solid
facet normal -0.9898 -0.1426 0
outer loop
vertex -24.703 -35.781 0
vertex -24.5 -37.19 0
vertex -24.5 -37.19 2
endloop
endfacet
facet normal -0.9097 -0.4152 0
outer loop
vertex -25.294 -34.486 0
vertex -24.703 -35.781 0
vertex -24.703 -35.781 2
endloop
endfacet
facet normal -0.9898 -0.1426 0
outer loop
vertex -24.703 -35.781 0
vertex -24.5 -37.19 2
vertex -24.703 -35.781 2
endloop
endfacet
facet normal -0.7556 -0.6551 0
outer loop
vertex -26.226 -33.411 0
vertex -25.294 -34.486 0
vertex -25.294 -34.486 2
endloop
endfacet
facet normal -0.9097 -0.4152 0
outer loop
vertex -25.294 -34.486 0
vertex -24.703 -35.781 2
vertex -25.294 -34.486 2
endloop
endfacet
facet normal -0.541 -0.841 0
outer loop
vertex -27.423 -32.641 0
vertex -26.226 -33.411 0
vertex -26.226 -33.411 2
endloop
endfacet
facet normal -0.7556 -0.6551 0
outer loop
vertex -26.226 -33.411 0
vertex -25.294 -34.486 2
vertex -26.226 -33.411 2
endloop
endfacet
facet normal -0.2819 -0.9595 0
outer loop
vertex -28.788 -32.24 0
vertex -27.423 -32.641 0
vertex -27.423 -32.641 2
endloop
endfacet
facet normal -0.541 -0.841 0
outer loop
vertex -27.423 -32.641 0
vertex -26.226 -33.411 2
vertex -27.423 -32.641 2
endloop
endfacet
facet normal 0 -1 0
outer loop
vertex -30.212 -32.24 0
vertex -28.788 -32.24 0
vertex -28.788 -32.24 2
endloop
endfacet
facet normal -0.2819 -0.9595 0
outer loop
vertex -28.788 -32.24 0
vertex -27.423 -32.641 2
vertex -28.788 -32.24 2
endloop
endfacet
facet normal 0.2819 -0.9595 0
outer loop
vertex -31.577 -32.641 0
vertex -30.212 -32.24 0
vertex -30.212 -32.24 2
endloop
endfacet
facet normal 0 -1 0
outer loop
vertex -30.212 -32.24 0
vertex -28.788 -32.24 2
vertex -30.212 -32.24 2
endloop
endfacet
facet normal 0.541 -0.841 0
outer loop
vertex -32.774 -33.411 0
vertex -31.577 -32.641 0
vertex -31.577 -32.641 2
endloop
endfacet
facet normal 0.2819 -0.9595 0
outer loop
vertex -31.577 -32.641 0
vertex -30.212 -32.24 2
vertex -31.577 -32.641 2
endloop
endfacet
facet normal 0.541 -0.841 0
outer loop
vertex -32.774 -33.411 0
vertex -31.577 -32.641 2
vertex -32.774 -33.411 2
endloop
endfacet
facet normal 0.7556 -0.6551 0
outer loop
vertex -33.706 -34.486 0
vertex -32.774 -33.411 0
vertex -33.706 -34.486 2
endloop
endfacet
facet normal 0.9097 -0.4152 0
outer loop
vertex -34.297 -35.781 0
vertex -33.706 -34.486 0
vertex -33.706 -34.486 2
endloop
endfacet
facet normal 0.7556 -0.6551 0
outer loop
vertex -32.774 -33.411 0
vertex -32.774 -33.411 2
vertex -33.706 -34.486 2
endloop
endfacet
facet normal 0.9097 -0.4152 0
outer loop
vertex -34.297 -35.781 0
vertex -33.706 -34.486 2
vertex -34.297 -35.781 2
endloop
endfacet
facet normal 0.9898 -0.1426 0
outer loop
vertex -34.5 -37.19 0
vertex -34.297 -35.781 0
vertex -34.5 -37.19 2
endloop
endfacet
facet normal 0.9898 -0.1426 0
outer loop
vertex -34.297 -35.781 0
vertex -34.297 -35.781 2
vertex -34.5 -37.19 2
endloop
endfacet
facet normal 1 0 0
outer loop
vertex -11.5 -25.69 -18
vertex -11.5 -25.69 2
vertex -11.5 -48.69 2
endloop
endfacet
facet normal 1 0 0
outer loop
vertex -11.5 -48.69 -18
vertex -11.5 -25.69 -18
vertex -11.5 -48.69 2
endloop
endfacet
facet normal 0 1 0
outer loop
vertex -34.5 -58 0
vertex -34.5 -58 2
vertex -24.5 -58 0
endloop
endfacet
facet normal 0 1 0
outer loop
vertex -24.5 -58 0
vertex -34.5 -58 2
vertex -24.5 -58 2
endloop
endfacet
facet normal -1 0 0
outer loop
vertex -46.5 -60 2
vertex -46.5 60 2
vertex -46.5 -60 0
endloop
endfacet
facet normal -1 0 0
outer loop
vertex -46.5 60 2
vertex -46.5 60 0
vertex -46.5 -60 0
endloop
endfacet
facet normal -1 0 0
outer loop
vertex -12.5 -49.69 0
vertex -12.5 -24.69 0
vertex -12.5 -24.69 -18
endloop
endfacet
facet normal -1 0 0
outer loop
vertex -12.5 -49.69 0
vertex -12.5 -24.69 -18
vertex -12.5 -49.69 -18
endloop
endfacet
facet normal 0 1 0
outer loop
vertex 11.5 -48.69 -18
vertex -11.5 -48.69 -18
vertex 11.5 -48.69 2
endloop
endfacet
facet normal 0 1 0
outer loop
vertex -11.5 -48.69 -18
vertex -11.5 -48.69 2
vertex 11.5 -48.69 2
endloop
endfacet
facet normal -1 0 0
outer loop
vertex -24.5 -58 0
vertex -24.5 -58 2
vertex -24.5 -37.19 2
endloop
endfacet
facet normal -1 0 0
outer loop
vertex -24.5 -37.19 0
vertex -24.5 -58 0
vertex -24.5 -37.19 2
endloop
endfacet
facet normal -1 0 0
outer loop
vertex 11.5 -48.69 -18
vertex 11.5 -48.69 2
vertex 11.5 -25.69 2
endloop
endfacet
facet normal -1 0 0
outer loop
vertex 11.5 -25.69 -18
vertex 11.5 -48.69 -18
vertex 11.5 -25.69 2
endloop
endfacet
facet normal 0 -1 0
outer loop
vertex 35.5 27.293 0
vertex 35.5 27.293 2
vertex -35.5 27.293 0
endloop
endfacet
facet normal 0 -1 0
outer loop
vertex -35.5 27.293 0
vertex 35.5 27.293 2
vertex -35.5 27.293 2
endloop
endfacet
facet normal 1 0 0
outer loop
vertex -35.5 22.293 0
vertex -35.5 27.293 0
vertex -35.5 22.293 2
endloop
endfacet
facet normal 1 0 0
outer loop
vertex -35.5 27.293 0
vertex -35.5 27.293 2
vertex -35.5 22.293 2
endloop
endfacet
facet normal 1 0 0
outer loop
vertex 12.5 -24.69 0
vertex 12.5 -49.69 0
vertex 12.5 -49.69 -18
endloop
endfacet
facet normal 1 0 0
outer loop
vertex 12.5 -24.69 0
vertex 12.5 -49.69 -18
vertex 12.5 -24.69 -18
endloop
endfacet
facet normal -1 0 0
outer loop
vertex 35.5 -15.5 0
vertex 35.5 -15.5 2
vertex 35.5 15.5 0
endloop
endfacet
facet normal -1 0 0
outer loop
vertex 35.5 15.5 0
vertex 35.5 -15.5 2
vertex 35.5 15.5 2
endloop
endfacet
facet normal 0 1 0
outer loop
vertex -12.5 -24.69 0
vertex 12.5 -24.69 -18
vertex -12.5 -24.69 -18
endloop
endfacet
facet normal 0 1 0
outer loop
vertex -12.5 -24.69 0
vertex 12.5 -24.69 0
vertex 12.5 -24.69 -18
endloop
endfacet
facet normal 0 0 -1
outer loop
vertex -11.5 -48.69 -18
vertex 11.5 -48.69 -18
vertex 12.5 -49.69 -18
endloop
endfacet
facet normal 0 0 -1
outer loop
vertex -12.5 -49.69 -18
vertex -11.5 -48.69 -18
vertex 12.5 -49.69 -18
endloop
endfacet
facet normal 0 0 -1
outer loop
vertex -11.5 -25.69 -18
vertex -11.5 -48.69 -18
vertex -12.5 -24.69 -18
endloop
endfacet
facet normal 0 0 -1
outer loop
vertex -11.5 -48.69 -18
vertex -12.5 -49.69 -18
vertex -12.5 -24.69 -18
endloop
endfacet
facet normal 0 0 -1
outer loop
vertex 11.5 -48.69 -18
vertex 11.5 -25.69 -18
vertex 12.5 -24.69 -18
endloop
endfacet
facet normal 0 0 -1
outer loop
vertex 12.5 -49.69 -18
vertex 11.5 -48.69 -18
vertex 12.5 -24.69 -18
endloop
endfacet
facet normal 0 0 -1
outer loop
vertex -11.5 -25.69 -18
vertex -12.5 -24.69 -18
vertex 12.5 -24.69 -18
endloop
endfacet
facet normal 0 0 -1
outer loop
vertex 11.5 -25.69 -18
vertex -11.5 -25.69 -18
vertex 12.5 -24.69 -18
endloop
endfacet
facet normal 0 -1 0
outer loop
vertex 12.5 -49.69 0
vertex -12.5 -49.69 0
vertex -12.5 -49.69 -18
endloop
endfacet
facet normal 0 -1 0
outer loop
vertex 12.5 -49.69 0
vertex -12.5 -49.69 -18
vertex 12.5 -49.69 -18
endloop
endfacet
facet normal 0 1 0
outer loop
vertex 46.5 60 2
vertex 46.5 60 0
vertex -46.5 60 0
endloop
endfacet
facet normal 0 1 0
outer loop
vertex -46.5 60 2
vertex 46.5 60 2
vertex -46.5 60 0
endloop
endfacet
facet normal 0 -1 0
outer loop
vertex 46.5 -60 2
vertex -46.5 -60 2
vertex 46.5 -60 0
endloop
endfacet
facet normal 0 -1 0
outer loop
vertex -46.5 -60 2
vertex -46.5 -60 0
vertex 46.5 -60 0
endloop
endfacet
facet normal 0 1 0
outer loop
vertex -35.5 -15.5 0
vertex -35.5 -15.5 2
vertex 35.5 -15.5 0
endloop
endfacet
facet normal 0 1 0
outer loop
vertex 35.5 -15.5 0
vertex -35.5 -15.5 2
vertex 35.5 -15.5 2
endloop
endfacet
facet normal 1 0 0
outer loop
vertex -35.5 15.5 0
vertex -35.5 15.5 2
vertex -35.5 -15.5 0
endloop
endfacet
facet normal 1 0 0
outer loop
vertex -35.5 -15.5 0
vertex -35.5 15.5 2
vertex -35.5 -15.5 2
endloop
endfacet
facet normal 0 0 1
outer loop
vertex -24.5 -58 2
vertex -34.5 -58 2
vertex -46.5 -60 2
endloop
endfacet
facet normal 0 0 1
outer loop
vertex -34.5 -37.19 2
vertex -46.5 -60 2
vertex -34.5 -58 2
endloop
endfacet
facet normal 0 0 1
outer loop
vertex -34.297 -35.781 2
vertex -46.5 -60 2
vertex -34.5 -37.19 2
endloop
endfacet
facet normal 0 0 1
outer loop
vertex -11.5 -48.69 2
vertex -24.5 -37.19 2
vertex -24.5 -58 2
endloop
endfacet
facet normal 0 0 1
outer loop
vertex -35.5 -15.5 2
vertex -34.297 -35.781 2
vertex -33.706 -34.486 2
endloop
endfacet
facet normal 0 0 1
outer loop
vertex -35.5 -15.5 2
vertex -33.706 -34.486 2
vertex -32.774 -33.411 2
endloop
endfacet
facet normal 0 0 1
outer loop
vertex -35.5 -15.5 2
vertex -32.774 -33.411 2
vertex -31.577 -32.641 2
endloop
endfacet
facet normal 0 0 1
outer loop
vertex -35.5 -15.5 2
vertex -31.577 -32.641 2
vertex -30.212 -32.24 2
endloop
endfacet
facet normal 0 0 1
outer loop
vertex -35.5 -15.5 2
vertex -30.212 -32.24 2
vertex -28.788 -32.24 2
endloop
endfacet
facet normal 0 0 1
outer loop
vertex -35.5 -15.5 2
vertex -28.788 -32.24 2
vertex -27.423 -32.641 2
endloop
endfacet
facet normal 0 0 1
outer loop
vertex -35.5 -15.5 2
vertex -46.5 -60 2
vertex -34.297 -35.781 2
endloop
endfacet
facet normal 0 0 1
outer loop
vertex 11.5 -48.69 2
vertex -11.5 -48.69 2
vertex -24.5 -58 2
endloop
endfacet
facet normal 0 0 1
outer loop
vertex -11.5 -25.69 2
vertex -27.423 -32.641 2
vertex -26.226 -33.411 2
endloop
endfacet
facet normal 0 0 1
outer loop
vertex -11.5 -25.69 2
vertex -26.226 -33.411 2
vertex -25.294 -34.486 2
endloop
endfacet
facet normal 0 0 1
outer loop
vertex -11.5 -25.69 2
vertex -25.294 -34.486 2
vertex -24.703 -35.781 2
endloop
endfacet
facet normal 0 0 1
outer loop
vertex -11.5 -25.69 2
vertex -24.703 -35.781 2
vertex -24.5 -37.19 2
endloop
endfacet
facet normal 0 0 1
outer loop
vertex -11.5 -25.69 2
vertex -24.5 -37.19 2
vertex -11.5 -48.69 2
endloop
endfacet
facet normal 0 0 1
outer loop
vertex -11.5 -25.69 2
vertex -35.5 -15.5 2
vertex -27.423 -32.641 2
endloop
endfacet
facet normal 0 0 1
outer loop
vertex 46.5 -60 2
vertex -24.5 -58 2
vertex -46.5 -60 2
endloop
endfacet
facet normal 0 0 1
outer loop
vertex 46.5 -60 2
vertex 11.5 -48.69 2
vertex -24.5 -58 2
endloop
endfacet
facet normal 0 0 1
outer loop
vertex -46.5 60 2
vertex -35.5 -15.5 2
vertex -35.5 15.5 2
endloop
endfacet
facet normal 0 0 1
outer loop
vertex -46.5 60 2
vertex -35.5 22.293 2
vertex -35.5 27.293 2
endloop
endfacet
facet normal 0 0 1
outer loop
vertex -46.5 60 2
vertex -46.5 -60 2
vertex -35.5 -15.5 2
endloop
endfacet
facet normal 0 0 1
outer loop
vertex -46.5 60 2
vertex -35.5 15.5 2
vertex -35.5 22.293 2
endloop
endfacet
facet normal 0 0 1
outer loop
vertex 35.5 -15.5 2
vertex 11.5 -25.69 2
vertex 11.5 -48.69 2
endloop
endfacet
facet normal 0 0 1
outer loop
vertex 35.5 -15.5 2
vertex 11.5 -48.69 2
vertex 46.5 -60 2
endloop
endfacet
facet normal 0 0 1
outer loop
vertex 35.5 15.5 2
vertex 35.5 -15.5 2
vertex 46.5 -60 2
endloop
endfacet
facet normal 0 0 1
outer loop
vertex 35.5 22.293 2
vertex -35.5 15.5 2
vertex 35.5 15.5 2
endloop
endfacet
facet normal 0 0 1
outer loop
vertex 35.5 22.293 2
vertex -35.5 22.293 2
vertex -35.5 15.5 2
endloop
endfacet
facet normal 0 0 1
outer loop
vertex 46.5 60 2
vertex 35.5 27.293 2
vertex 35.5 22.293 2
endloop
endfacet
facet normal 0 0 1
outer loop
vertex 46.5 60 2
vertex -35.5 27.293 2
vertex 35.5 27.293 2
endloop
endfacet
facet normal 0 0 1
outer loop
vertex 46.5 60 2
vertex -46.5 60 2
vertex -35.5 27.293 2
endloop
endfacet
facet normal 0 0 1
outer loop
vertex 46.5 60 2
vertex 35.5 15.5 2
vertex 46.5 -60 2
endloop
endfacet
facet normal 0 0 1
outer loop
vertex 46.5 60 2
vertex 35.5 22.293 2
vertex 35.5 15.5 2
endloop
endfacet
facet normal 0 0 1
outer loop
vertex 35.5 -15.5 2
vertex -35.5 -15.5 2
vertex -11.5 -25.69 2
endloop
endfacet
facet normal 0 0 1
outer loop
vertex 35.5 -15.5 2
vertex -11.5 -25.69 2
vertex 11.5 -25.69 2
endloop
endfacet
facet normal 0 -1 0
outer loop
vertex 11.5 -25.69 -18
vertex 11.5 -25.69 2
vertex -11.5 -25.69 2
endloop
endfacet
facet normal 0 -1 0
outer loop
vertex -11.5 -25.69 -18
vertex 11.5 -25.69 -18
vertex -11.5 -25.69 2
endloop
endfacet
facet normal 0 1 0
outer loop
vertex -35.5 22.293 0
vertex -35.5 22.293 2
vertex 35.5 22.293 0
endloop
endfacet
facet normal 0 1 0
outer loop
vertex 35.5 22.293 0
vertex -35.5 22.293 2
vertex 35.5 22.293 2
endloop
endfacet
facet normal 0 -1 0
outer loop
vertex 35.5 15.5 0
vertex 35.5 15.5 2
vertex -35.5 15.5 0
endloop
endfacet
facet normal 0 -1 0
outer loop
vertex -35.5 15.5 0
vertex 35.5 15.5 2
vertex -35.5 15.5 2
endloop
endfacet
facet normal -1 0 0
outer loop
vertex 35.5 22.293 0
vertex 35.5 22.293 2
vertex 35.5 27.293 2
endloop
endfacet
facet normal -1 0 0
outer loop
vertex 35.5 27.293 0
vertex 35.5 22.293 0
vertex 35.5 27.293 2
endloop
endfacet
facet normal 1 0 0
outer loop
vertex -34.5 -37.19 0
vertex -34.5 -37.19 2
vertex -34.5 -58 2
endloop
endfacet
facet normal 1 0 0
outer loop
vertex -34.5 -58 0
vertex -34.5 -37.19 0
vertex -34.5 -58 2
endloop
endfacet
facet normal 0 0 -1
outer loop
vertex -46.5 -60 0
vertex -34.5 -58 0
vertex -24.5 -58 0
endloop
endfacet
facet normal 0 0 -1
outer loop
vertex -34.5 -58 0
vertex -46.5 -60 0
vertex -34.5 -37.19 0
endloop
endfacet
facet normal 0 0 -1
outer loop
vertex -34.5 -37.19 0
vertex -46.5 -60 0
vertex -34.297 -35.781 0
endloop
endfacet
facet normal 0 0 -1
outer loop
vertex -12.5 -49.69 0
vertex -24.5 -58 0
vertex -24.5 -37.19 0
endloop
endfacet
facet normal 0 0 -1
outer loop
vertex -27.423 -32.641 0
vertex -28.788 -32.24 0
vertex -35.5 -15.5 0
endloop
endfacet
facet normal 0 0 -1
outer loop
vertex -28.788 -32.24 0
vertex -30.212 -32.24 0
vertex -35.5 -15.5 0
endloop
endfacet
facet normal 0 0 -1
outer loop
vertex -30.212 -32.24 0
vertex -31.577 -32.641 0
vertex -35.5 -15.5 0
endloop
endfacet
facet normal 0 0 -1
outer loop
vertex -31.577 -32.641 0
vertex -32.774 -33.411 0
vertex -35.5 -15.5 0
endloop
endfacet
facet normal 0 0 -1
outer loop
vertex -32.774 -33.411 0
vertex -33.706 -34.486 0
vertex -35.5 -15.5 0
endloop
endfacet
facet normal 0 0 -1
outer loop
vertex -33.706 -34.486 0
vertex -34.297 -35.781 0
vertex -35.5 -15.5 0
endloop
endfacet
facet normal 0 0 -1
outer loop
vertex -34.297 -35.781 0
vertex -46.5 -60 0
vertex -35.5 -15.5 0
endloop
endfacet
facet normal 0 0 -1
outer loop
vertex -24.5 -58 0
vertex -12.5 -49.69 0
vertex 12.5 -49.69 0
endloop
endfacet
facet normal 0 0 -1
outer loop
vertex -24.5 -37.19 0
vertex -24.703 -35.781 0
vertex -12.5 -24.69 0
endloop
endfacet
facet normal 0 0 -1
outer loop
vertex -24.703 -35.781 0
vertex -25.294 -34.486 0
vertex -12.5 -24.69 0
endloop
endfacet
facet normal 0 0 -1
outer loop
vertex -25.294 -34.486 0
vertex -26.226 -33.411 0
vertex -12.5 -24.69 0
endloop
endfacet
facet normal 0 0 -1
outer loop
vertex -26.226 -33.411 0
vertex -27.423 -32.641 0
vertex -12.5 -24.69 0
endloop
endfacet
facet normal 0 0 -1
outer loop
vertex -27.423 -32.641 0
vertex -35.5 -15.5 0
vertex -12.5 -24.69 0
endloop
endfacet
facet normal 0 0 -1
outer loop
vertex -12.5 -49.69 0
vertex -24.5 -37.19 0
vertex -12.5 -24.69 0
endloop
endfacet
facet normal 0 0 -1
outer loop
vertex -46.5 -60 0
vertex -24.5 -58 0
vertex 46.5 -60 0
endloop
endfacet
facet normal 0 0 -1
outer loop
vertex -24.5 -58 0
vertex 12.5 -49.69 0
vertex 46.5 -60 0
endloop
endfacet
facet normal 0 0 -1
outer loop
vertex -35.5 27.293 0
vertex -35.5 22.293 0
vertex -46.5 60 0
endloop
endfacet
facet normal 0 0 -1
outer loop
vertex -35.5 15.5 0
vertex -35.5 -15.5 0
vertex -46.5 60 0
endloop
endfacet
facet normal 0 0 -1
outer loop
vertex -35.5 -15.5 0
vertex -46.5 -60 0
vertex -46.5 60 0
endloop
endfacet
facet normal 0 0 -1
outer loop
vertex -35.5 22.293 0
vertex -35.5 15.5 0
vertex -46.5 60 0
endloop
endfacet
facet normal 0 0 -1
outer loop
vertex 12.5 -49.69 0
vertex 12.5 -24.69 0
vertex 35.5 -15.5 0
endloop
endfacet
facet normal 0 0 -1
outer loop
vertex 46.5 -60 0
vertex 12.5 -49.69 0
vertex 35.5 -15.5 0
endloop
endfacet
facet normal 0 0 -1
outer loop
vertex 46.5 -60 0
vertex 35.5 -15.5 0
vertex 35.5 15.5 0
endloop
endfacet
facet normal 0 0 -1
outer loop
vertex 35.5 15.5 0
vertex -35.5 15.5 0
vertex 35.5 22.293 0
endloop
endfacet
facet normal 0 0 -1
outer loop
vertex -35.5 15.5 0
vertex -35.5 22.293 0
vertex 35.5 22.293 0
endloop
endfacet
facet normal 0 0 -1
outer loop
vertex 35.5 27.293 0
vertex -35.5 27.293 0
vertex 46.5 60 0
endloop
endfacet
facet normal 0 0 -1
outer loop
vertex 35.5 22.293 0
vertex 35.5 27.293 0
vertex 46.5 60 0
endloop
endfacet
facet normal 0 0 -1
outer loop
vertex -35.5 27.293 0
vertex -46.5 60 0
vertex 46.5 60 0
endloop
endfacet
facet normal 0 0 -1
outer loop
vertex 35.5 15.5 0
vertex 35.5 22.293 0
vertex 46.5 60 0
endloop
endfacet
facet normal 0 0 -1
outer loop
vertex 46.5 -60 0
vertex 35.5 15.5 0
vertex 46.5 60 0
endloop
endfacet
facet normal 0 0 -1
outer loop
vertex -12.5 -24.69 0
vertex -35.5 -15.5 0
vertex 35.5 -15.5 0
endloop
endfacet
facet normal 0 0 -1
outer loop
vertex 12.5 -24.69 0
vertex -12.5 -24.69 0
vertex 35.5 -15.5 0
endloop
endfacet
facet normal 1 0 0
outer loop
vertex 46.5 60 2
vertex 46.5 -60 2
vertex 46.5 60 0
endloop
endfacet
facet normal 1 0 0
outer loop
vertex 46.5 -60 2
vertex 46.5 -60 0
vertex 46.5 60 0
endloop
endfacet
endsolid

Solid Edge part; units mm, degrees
sketch "Sketch1" plane through (0, 0, 0) normal (0, 0, 1) x (1, 0, 0)
  line L0 (-46.5, -60) -> (46.5, -60)
  line L1 (46.5, -60) -> (46.5, 60)
  line L2 (46.5, 60) -> (-46.5, 60)
  line L3 (-46.5, 60) -> (-46.5, -60)
extrude "Protrusion1" add sketch "Sketch1" along normal blind 2
sketch "Sketch2" plane through (0, 0, 2) normal (0, 0, 1) x (1, 0, 0)
  line L0 (-35.5, -15.5) -> (35.5, -15.5)
  line L1 (35.5, -15.5) -> (35.5, 15.5)
  line L2 (35.5, 15.5) -> (-35.5, 15.5)
  line L3 (-35.5, 15.5) -> (-35.5, -15.5)
extrude "Cutout1" cut sketch "Sketch2" against normal up to next
sketch "Sketch3" plane through (0, 0, 2) normal (0, 0, 1) x (1, 0, 0)
  line L0 (-35.5, 22.293) -> (35.5, 22.293)
  line L1 (35.5, 22.293) -> (35.5, 27.293)
  line L2 (35.5, 27.293) -> (-35.5, 27.293)
  line L3 (-35.5, 27.293) -> (-35.5, 22.293)
extrude "Cutout2" cut sketch "Sketch3" against normal up to next
sketch "Sketch4" plane through (0, 0, 2) normal (0, 0, 1) x (1, 0, 0)
  line L0 (11.5, -25.6896) -> (-11.5, -25.6896)
  line L1 (-11.5, -25.6896) -> (-11.5, -48.6896)
  line L2 (-11.5, -48.6896) -> (11.5, -48.6896)
  line L3 (11.5, -48.6896) -> (11.5, -25.6896)
extrude "Cutout3" cut sketch "Sketch4" against normal up to next
sketch "Sketch5" plane through (0, 0, 2) normal (0, 0, 1) x (1, 0, 0)
  line L0 (-12.5, -24.6896) -> (-12.5, -49.6896)
  line L1 (-12.5, -49.6896) -> (12.5, -49.6896)
  line L2 (12.5, -49.6896) -> (12.5, -24.6896)
  line L3 (12.5, -24.6896) -> (-12.5, -24.6896)
  line L4 (-11.5, -25.6896) -> (-11.5, -48.6896)
  line L5 (-11.5, -48.6896) -> (11.5, -48.6896)
  line L6 (11.5, -48.6896) -> (11.5, -25.6896)
  line L7 (11.5, -25.6896) -> (-11.5, -25.6896)
extrude "Protrusion2" add sketch "Sketch5" against normal blind 20
sketch "Sketch6" plane through (0, 0, 2) normal (0, 0, 1) x (1, 0, 0)
  arc A0 (-34.5, -37.1896) -> (-24.5, -37.1896) centre (-29.5, -37.1896) cw
  line L0 (-34.5, -37.1896) -> (-34.5, -58)
  line L1 (-24.5, -58) -> (-24.5, -37.1896)
  line L2 (-34.5, -58) -> (-24.5, -58)
extrude "Cutout4" cut sketch "Sketch6" against normal up to next
